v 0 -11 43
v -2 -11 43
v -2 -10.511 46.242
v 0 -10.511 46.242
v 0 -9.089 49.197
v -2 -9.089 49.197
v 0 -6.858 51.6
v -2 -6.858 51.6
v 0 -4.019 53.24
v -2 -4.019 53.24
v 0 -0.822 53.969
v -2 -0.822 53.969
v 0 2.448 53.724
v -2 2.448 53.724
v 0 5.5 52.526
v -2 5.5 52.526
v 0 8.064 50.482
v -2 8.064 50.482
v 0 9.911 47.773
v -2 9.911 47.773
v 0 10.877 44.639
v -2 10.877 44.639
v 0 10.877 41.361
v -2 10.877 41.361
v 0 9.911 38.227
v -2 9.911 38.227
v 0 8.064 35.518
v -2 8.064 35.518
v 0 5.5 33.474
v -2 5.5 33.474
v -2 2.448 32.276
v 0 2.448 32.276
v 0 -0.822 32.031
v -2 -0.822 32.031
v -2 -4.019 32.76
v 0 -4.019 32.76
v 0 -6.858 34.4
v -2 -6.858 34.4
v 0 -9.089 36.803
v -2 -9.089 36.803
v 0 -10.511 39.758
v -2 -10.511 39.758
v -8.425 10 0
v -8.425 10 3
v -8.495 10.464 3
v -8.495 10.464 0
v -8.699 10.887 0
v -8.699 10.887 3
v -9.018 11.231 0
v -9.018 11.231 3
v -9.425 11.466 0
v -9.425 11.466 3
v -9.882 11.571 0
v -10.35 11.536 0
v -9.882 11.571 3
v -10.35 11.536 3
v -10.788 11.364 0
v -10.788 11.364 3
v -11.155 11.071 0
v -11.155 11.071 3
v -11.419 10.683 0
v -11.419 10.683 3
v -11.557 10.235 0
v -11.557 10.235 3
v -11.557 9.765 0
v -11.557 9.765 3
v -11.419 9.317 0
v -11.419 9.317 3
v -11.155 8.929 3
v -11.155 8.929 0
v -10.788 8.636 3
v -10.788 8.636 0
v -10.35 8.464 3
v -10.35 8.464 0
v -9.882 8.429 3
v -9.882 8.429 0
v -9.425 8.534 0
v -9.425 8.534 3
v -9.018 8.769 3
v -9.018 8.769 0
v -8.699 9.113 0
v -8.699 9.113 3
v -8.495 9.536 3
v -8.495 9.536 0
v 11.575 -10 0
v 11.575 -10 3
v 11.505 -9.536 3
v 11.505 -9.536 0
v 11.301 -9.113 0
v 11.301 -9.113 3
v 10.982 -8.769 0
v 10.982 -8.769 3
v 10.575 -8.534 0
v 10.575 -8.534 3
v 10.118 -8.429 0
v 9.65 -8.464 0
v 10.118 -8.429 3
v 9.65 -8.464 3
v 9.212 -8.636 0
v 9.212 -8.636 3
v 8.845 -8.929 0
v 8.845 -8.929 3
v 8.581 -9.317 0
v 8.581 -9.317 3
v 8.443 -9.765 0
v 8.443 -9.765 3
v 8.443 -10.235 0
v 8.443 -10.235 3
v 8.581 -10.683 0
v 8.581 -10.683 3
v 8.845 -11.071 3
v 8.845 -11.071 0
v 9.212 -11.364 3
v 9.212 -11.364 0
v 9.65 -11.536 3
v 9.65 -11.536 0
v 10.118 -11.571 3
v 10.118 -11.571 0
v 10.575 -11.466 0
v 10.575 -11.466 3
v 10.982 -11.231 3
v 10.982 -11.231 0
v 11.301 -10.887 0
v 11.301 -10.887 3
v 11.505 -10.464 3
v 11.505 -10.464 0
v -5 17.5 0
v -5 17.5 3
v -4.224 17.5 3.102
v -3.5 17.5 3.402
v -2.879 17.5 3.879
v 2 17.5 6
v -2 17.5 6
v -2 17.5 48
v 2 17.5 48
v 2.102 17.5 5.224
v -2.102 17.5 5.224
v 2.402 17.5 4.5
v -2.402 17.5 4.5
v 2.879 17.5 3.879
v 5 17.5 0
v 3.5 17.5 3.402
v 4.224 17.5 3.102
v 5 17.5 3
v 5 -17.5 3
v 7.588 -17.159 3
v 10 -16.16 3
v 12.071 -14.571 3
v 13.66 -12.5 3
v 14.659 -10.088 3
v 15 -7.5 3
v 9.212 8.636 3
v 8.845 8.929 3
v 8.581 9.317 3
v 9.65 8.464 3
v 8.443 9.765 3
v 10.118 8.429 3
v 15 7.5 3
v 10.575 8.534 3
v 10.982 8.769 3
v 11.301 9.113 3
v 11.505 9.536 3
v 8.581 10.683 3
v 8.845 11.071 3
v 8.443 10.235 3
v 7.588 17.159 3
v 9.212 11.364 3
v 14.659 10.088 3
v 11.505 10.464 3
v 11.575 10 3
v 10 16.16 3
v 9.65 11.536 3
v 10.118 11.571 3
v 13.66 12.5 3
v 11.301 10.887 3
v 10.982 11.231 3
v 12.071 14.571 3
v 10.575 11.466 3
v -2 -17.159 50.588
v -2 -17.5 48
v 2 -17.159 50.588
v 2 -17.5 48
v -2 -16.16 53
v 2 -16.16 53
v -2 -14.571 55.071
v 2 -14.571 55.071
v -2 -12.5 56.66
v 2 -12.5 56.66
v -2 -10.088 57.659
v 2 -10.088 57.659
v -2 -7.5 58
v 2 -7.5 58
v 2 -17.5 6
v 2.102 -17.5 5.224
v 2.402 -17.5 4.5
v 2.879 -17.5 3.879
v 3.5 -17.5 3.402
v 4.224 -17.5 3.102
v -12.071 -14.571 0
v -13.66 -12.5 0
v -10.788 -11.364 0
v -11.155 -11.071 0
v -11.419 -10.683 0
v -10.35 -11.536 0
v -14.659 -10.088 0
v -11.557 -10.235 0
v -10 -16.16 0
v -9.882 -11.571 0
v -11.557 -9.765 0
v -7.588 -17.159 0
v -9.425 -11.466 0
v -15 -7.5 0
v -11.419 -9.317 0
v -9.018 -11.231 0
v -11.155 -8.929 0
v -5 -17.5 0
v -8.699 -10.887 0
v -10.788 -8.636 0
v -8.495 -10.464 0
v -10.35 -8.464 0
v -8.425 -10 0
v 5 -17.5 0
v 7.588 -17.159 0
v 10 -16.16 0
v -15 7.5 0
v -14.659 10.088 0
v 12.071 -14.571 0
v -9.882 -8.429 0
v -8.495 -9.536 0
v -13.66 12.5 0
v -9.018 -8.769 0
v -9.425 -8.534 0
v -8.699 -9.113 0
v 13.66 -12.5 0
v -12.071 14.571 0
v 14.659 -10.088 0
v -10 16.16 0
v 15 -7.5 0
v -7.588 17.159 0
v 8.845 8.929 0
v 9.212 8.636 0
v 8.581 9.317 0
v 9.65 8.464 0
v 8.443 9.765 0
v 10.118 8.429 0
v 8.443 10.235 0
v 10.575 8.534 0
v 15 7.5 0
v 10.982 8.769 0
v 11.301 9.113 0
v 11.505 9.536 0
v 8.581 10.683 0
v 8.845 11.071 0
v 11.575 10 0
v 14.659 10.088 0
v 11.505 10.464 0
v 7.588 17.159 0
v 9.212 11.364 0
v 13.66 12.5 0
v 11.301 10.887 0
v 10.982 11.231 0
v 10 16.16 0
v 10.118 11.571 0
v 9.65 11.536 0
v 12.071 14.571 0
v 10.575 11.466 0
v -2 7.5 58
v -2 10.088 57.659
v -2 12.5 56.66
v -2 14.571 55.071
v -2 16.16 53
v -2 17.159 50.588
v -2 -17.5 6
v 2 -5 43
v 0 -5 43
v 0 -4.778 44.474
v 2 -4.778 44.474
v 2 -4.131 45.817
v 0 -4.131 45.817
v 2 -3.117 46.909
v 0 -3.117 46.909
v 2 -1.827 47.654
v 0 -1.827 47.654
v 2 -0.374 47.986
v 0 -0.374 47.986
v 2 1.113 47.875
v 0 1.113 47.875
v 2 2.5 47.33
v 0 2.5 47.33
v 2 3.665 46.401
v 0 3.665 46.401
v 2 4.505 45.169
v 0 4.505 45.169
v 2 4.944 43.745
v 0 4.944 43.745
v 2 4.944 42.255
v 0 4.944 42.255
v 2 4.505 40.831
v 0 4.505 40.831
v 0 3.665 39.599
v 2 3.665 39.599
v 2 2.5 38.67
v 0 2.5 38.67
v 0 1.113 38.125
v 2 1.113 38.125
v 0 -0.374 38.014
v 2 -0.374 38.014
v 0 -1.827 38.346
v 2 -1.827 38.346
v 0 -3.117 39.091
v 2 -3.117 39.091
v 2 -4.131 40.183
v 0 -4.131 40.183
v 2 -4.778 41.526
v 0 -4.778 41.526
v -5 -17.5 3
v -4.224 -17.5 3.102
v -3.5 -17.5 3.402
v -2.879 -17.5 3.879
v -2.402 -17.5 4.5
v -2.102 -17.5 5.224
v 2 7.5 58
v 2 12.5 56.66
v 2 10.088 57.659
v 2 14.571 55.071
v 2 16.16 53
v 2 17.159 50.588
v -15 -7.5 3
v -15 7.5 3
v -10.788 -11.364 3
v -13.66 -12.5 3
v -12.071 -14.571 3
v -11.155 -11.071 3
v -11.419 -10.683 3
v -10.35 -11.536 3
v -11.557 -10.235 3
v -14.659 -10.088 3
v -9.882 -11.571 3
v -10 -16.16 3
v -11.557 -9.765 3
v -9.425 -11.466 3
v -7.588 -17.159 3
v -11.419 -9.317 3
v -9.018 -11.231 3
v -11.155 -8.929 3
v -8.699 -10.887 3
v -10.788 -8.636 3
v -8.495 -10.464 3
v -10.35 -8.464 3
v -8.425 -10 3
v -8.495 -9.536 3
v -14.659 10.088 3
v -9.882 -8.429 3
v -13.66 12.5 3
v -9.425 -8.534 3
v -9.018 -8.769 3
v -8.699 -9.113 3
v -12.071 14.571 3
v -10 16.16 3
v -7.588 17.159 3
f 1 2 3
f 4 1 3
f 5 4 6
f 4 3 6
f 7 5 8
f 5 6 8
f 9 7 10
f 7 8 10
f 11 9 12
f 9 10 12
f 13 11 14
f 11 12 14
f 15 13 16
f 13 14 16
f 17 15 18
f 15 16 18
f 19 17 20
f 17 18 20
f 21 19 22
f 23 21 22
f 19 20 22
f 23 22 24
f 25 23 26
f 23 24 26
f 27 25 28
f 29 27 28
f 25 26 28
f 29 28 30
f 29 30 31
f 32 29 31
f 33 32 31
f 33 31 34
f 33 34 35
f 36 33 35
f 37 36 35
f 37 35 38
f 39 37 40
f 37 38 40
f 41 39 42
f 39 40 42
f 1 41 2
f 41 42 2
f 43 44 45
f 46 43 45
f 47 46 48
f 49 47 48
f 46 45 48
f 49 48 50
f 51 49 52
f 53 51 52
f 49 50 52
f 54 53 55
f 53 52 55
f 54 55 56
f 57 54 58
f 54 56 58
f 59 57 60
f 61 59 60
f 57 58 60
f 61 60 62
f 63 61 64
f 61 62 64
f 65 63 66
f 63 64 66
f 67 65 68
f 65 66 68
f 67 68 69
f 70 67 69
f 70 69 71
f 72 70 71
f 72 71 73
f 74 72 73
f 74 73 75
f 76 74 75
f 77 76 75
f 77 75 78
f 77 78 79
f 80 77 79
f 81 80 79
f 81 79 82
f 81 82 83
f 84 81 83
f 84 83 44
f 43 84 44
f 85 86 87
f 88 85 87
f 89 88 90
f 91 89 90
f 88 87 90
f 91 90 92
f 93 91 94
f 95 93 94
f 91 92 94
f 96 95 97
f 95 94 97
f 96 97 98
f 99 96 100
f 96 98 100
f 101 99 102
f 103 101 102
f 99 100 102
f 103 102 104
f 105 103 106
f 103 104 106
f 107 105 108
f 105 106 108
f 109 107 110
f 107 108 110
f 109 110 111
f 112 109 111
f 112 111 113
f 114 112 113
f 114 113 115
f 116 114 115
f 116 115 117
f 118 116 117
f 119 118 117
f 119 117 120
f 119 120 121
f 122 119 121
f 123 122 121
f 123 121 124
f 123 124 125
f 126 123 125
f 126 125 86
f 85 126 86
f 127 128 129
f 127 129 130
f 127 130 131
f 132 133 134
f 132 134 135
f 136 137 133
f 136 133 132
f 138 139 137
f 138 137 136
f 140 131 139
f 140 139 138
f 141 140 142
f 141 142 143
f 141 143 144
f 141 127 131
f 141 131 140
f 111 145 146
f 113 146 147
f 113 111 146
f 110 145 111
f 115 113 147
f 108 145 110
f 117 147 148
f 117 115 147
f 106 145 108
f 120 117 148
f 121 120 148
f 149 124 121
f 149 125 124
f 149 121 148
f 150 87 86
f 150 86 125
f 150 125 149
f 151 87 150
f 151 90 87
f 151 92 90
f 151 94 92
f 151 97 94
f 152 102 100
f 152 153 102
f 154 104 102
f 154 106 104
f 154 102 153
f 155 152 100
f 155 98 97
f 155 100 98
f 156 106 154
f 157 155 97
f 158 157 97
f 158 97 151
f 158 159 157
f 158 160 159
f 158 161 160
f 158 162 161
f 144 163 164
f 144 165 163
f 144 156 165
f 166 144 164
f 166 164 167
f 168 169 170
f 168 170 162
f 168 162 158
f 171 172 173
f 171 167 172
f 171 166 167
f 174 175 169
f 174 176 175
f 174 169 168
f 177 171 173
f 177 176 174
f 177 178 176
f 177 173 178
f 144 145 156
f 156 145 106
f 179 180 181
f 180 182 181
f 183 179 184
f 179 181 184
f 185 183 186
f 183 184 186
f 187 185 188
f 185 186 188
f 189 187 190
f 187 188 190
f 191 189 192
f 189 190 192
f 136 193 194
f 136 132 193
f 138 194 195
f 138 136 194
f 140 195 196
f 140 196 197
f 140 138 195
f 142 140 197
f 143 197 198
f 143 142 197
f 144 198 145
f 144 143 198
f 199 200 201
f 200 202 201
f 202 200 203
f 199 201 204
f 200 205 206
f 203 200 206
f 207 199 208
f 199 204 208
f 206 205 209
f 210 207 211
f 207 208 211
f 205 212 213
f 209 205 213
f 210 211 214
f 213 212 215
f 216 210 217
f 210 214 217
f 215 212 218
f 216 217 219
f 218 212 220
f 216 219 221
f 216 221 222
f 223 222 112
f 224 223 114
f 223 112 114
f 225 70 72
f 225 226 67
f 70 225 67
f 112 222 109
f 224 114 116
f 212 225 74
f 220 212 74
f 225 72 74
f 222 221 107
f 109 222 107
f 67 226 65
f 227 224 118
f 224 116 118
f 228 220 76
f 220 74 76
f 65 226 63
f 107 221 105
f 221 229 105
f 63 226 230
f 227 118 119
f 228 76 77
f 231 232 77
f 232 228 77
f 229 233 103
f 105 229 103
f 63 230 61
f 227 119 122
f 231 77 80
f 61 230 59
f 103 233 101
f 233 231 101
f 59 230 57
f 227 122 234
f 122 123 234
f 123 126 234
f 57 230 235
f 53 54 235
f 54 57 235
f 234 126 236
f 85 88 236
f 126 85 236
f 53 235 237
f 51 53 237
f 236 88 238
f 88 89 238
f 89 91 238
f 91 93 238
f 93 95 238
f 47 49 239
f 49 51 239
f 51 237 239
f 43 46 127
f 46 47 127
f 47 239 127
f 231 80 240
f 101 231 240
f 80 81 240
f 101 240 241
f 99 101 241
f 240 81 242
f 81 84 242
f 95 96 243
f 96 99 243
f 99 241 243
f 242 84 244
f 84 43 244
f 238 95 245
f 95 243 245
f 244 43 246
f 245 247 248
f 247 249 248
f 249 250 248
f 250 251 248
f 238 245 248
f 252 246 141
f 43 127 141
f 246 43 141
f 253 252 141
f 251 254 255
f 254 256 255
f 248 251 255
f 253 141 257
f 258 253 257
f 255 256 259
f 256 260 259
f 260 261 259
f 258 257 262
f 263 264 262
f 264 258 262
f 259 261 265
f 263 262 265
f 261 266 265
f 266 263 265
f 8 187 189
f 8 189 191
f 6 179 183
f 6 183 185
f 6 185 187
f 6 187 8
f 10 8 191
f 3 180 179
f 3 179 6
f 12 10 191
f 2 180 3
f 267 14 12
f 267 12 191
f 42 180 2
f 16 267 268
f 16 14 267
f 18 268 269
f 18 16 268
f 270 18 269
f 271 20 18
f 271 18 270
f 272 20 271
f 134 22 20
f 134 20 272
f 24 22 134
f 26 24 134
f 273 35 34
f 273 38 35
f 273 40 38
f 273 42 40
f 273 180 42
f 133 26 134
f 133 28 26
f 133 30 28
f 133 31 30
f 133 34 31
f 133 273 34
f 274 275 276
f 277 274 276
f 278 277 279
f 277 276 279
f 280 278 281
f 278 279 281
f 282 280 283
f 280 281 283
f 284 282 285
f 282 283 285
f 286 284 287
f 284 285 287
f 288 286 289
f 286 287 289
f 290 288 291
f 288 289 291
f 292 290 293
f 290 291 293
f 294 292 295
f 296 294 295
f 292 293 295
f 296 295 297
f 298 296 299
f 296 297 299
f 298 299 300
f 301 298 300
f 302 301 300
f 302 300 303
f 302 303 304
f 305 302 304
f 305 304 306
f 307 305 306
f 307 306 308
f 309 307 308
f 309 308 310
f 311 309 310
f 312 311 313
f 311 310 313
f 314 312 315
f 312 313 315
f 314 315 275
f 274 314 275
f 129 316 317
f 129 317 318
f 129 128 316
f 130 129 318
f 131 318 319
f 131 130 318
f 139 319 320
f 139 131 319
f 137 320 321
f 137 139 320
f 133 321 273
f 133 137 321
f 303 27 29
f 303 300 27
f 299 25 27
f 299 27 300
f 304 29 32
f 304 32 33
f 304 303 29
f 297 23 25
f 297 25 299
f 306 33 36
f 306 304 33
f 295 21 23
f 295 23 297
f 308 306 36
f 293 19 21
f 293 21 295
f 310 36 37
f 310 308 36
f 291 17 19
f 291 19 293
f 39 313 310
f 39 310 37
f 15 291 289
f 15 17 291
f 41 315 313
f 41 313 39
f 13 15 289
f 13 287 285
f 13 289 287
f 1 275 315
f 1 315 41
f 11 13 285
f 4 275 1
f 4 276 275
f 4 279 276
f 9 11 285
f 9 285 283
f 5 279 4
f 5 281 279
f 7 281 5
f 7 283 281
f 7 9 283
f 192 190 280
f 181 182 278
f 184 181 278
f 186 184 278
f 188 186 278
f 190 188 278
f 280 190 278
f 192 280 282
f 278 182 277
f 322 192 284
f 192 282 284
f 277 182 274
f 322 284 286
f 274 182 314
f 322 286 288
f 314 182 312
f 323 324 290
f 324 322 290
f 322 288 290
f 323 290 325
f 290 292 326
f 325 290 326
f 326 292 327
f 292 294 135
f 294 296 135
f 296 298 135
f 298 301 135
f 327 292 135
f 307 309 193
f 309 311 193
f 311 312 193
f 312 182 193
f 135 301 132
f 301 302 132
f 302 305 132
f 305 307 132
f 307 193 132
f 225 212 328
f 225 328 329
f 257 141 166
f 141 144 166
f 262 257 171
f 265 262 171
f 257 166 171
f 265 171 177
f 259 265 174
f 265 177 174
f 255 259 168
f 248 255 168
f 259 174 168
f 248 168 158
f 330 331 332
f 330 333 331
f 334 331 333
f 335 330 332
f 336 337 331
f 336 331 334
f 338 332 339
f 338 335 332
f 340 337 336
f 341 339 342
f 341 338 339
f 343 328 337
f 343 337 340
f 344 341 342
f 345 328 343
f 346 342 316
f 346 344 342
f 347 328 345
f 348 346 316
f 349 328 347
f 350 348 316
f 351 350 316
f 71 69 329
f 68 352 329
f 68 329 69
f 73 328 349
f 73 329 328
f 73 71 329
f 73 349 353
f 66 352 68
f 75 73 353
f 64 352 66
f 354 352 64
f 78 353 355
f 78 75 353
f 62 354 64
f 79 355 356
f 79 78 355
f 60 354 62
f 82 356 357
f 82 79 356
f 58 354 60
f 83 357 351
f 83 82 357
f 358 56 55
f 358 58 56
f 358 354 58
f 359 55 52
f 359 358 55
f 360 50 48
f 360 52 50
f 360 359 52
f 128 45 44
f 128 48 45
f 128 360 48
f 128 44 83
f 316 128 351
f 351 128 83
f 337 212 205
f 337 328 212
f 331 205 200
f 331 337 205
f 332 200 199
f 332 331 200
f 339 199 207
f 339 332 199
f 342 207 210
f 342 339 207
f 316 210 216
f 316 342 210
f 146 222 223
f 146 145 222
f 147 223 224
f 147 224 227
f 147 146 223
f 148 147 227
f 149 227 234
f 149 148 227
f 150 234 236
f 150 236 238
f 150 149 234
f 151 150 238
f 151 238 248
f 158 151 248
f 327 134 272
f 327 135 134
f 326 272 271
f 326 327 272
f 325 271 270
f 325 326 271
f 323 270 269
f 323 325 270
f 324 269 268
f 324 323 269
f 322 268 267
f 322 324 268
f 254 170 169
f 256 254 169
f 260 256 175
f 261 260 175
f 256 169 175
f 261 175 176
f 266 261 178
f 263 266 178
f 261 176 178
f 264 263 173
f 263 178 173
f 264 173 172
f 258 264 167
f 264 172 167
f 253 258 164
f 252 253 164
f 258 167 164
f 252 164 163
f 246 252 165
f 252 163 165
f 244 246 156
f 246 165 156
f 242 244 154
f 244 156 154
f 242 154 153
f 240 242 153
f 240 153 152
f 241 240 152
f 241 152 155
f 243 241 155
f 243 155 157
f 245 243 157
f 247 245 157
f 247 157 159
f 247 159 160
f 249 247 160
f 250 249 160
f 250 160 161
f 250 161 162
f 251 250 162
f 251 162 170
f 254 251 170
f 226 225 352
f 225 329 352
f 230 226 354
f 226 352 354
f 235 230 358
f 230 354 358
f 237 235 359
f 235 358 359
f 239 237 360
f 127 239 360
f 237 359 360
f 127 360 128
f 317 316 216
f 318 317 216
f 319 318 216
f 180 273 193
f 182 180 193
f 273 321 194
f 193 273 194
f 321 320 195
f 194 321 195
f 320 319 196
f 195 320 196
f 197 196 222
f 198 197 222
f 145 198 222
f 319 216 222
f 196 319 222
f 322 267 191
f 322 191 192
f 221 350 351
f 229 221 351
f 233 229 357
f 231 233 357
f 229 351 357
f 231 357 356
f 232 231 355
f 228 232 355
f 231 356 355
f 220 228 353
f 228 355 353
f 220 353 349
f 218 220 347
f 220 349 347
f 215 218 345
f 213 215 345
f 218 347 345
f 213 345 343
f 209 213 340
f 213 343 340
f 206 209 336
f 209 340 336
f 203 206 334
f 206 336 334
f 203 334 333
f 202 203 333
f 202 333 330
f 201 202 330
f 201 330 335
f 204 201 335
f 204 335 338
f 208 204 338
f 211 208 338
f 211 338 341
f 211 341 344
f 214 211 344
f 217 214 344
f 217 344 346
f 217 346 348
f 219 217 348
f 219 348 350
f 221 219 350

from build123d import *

# Parameters (mm, degrees)
SKETCH1_W           = 30
SKETCH1_H           = 35
BOSS_EXTRUDE2_DEPTH = 3
SKETCH3_W           = 4
SKETCH3_H           = 35
BOSS_EXTRUDE3_DEPTH = 55
SKETCH4_R           = 1.575
CUT_EXTRUDE2_DEPTH  = 55
FILLET1_R           = 10
SKETCH5_R           = 11
CUT_EXTRUDE3_DEPTH  = 2
SKETCH6_R           = 5
CUT_EXTRUDE4_DEPTH  = 2
FILLET2_R           = 3


with BuildPart() as part:
    # Sketch1 → Boss-Extrude2 (new body)
    with BuildSketch(Plane.XY):
        Rectangle(SKETCH1_W, SKETCH1_H)
    extrude(amount=BOSS_EXTRUDE2_DEPTH)

    # Sketch3 → Boss-Extrude3 (add)
    with BuildSketch(Plane.XY.offset(3)):
        Rectangle(SKETCH3_W, SKETCH3_H)
    extrude(amount=BOSS_EXTRUDE3_DEPTH)

    # Sketch4 → Cut-Extrude2 (cut)
    with BuildSketch(Plane.XY.offset(3)):
        with Locations((10, 10)):
            Circle(SKETCH4_R)
        with Locations((10, -10)):
            Circle(SKETCH4_R)
        with Locations((-10, -10)):
            Circle(SKETCH4_R)
        with Locations((-10, 10)):
            Circle(SKETCH4_R)
    extrude(amount=-CUT_EXTRUDE2_DEPTH, mode=Mode.SUBTRACT)

    # Fillet1
    fillet1_edges = [part.edges().sort_by_distance(p)[0] for p in [
        (0, 17.5, 58),
        (0, -17.5, 58),
        (15, -17.5, 1.5),
        (-15, -17.5, 1.5),
        (-15, 17.5, 1.5),
        (15, 17.5, 1.5),
    ]]
    fillet(fillet1_edges, radius=FILLET1_R)

    # Sketch5 → Cut-Extrude3 (cut)
    with BuildSketch(Plane.ZY.offset(2)):
        with Locations(Location((43, 0, 0), (0, 0, 270))):
            Circle(SKETCH5_R)
    extrude(amount=-CUT_EXTRUDE3_DEPTH, mode=Mode.SUBTRACT)

    # Sketch6 → Cut-Extrude4 (cut)
    with BuildSketch(Plane.ZY):
        with Locations(Location((43, 0, 0), (0, 0, 270))):
            Circle(SKETCH6_R)
    extrude(amount=-CUT_EXTRUDE4_DEPTH, mode=Mode.SUBTRACT)

    # Fillet2
    fillet2_edges = [part.edges().sort_by_distance(p)[0] for p in [
        (2, 0, 3),
        (-2, 0, 3),
    ]]
    fillet(fillet2_edges, radius=FILLET2_R)


solid = part.part
